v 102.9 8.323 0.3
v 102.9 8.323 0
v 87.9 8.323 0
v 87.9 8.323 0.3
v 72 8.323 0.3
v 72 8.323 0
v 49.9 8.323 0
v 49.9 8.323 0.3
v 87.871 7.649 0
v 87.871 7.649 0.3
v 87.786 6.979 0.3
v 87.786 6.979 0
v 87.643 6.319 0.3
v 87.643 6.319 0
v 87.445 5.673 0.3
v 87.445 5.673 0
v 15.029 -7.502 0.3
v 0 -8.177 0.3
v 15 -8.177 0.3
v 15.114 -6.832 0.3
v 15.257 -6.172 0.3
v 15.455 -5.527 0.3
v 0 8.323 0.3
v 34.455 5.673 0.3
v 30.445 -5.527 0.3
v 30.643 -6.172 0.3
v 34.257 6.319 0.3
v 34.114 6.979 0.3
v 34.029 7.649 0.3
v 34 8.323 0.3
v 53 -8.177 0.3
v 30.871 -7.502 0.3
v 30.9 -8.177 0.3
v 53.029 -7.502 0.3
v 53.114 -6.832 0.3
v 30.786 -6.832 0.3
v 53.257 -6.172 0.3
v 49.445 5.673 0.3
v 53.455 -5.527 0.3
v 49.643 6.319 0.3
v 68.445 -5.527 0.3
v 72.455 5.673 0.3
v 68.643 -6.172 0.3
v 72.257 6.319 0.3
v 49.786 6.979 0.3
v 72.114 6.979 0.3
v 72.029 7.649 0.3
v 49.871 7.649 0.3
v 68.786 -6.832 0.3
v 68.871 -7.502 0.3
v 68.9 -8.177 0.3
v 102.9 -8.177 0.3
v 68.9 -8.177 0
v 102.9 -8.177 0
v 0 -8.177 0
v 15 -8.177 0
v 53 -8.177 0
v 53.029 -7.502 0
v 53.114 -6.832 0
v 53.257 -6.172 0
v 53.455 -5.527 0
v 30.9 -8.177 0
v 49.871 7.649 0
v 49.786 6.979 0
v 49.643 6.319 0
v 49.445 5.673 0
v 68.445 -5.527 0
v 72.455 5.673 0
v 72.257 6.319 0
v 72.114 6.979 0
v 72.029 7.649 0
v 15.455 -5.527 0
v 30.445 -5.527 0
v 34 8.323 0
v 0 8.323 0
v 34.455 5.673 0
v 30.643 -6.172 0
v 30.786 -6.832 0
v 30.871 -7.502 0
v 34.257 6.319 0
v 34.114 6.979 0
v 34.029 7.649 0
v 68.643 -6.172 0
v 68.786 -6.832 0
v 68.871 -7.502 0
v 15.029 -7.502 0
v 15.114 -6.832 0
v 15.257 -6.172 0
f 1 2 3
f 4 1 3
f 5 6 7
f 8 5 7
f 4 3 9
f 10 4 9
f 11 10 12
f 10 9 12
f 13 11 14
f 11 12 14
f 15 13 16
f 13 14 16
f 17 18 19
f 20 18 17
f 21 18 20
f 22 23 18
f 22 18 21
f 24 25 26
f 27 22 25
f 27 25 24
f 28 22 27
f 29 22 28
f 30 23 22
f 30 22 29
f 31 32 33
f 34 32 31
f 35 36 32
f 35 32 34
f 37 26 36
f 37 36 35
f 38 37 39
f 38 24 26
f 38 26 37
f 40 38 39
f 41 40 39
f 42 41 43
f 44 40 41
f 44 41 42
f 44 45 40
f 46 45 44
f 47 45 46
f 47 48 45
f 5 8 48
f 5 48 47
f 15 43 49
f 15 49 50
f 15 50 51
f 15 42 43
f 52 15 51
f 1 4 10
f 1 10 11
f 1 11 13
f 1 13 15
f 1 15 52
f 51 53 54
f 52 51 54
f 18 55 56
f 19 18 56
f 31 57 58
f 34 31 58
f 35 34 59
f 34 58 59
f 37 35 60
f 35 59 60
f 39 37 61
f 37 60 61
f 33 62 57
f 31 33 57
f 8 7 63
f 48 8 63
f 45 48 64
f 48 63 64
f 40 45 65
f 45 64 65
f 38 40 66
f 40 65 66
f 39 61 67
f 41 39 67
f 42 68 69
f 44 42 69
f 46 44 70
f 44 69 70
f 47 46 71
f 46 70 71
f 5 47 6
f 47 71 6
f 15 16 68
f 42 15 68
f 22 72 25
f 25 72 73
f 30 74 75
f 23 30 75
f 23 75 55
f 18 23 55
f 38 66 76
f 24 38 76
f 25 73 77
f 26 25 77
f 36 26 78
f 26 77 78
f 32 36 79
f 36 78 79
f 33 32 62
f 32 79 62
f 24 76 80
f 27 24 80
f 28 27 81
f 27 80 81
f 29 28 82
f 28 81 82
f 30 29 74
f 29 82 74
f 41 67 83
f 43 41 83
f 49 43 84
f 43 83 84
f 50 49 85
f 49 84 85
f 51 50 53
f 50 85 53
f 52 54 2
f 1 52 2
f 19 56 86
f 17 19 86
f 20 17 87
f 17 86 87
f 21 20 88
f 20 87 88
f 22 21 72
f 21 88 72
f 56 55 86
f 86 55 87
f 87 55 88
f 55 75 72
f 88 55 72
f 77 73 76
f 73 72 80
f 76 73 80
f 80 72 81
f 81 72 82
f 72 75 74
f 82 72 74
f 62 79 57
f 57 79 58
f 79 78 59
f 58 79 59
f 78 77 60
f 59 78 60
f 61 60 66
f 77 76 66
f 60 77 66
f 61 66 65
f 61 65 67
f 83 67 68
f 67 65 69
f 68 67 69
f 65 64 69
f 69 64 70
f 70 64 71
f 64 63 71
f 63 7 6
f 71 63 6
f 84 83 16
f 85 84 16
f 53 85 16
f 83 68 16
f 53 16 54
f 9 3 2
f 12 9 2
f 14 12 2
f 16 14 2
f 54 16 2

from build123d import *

# Parameters (mm, degrees)
F1_DEPTH = 0.3


with BuildPart() as f1:
    # F0 (on Top) → F1 (new body)
    with BuildSketch(Plane.XY):
        with BuildLine():
            ThreePointArc((68.445332, -5.526652), (68.785509, -6.832291), (68.9, -8.176652))
            Line((68.9, -8.176652), (102.9, -8.176652))
            Line((102.9, -8.176652), (102.9, 8.323348))
            Line((102.9, 8.323348), (87.9, 8.323348))
            ThreePointArc((87.9, 8.323348), (87.785509, 6.978988), (87.445332, 5.673348))
            ThreePointArc((87.445332, 5.673348), (79.95, 0.373348), (72.454668, 5.673348))
            ThreePointArc((72.454668, 5.673348), (72.114491, 6.978988), (72, 8.323348))
            Line((72, 8.323348), (49.9, 8.323348))
            ThreePointArc((49.9, 8.323348), (49.785509, 6.978988), (49.445332, 5.673348))
            ThreePointArc((49.445332, 5.673348), (41.95, 0.373348), (34.454668, 5.673348))
            ThreePointArc((34.454668, 5.673348), (34.114491, 6.978988), (34, 8.323348))
            Line((34, 8.323348), (0, 8.323348))
            Line((0, 8.323348), (0, -8.176652))
            Line((0, -8.176652), (15, -8.176652))
            ThreePointArc((15, -8.176652), (15.114491, -6.832291), (15.454668, -5.526652))
            ThreePointArc((15.454668, -5.526652), (22.95, -0.226652), (30.445332, -5.526652))
            ThreePointArc((30.445332, -5.526652), (30.785509, -6.832291), (30.9, -8.176652))
            Line((30.9, -8.176652), (53, -8.176652))
            ThreePointArc((53, -8.176652), (53.114491, -6.832291), (53.454668, -5.526652))
            ThreePointArc((53.454668, -5.526652), (60.95, -0.226652), (68.445332, -5.526652))
        make_face()
        with BuildLine():
            Line((15.454668, -5.526652), (30.445332, -5.526652))
            ThreePointArc((30.445332, -5.526652), (22.95, -0.226652), (15.454668, -5.526652))
        make_face()
        with BuildLine():
            ThreePointArc((34.454668, 5.673348), (41.95, 0.373348), (49.445332, 5.673348))
            Line((49.445332, 5.673348), (34.454668, 5.673348))
        make_face()
        with BuildLine():
            Line((53.454668, -5.526652), (68.445332, -5.526652))
            ThreePointArc((68.445332, -5.526652), (60.95, -0.226652), (53.454668, -5.526652))
        make_face()
        with BuildLine():
            ThreePointArc((72.454668, 5.673348), (79.95, 0.373348), (87.445332, 5.673348))
            Line((87.445332, 5.673348), (72.454668, 5.673348))
        make_face()
    extrude(amount=F1_DEPTH)


solid = f1.part
